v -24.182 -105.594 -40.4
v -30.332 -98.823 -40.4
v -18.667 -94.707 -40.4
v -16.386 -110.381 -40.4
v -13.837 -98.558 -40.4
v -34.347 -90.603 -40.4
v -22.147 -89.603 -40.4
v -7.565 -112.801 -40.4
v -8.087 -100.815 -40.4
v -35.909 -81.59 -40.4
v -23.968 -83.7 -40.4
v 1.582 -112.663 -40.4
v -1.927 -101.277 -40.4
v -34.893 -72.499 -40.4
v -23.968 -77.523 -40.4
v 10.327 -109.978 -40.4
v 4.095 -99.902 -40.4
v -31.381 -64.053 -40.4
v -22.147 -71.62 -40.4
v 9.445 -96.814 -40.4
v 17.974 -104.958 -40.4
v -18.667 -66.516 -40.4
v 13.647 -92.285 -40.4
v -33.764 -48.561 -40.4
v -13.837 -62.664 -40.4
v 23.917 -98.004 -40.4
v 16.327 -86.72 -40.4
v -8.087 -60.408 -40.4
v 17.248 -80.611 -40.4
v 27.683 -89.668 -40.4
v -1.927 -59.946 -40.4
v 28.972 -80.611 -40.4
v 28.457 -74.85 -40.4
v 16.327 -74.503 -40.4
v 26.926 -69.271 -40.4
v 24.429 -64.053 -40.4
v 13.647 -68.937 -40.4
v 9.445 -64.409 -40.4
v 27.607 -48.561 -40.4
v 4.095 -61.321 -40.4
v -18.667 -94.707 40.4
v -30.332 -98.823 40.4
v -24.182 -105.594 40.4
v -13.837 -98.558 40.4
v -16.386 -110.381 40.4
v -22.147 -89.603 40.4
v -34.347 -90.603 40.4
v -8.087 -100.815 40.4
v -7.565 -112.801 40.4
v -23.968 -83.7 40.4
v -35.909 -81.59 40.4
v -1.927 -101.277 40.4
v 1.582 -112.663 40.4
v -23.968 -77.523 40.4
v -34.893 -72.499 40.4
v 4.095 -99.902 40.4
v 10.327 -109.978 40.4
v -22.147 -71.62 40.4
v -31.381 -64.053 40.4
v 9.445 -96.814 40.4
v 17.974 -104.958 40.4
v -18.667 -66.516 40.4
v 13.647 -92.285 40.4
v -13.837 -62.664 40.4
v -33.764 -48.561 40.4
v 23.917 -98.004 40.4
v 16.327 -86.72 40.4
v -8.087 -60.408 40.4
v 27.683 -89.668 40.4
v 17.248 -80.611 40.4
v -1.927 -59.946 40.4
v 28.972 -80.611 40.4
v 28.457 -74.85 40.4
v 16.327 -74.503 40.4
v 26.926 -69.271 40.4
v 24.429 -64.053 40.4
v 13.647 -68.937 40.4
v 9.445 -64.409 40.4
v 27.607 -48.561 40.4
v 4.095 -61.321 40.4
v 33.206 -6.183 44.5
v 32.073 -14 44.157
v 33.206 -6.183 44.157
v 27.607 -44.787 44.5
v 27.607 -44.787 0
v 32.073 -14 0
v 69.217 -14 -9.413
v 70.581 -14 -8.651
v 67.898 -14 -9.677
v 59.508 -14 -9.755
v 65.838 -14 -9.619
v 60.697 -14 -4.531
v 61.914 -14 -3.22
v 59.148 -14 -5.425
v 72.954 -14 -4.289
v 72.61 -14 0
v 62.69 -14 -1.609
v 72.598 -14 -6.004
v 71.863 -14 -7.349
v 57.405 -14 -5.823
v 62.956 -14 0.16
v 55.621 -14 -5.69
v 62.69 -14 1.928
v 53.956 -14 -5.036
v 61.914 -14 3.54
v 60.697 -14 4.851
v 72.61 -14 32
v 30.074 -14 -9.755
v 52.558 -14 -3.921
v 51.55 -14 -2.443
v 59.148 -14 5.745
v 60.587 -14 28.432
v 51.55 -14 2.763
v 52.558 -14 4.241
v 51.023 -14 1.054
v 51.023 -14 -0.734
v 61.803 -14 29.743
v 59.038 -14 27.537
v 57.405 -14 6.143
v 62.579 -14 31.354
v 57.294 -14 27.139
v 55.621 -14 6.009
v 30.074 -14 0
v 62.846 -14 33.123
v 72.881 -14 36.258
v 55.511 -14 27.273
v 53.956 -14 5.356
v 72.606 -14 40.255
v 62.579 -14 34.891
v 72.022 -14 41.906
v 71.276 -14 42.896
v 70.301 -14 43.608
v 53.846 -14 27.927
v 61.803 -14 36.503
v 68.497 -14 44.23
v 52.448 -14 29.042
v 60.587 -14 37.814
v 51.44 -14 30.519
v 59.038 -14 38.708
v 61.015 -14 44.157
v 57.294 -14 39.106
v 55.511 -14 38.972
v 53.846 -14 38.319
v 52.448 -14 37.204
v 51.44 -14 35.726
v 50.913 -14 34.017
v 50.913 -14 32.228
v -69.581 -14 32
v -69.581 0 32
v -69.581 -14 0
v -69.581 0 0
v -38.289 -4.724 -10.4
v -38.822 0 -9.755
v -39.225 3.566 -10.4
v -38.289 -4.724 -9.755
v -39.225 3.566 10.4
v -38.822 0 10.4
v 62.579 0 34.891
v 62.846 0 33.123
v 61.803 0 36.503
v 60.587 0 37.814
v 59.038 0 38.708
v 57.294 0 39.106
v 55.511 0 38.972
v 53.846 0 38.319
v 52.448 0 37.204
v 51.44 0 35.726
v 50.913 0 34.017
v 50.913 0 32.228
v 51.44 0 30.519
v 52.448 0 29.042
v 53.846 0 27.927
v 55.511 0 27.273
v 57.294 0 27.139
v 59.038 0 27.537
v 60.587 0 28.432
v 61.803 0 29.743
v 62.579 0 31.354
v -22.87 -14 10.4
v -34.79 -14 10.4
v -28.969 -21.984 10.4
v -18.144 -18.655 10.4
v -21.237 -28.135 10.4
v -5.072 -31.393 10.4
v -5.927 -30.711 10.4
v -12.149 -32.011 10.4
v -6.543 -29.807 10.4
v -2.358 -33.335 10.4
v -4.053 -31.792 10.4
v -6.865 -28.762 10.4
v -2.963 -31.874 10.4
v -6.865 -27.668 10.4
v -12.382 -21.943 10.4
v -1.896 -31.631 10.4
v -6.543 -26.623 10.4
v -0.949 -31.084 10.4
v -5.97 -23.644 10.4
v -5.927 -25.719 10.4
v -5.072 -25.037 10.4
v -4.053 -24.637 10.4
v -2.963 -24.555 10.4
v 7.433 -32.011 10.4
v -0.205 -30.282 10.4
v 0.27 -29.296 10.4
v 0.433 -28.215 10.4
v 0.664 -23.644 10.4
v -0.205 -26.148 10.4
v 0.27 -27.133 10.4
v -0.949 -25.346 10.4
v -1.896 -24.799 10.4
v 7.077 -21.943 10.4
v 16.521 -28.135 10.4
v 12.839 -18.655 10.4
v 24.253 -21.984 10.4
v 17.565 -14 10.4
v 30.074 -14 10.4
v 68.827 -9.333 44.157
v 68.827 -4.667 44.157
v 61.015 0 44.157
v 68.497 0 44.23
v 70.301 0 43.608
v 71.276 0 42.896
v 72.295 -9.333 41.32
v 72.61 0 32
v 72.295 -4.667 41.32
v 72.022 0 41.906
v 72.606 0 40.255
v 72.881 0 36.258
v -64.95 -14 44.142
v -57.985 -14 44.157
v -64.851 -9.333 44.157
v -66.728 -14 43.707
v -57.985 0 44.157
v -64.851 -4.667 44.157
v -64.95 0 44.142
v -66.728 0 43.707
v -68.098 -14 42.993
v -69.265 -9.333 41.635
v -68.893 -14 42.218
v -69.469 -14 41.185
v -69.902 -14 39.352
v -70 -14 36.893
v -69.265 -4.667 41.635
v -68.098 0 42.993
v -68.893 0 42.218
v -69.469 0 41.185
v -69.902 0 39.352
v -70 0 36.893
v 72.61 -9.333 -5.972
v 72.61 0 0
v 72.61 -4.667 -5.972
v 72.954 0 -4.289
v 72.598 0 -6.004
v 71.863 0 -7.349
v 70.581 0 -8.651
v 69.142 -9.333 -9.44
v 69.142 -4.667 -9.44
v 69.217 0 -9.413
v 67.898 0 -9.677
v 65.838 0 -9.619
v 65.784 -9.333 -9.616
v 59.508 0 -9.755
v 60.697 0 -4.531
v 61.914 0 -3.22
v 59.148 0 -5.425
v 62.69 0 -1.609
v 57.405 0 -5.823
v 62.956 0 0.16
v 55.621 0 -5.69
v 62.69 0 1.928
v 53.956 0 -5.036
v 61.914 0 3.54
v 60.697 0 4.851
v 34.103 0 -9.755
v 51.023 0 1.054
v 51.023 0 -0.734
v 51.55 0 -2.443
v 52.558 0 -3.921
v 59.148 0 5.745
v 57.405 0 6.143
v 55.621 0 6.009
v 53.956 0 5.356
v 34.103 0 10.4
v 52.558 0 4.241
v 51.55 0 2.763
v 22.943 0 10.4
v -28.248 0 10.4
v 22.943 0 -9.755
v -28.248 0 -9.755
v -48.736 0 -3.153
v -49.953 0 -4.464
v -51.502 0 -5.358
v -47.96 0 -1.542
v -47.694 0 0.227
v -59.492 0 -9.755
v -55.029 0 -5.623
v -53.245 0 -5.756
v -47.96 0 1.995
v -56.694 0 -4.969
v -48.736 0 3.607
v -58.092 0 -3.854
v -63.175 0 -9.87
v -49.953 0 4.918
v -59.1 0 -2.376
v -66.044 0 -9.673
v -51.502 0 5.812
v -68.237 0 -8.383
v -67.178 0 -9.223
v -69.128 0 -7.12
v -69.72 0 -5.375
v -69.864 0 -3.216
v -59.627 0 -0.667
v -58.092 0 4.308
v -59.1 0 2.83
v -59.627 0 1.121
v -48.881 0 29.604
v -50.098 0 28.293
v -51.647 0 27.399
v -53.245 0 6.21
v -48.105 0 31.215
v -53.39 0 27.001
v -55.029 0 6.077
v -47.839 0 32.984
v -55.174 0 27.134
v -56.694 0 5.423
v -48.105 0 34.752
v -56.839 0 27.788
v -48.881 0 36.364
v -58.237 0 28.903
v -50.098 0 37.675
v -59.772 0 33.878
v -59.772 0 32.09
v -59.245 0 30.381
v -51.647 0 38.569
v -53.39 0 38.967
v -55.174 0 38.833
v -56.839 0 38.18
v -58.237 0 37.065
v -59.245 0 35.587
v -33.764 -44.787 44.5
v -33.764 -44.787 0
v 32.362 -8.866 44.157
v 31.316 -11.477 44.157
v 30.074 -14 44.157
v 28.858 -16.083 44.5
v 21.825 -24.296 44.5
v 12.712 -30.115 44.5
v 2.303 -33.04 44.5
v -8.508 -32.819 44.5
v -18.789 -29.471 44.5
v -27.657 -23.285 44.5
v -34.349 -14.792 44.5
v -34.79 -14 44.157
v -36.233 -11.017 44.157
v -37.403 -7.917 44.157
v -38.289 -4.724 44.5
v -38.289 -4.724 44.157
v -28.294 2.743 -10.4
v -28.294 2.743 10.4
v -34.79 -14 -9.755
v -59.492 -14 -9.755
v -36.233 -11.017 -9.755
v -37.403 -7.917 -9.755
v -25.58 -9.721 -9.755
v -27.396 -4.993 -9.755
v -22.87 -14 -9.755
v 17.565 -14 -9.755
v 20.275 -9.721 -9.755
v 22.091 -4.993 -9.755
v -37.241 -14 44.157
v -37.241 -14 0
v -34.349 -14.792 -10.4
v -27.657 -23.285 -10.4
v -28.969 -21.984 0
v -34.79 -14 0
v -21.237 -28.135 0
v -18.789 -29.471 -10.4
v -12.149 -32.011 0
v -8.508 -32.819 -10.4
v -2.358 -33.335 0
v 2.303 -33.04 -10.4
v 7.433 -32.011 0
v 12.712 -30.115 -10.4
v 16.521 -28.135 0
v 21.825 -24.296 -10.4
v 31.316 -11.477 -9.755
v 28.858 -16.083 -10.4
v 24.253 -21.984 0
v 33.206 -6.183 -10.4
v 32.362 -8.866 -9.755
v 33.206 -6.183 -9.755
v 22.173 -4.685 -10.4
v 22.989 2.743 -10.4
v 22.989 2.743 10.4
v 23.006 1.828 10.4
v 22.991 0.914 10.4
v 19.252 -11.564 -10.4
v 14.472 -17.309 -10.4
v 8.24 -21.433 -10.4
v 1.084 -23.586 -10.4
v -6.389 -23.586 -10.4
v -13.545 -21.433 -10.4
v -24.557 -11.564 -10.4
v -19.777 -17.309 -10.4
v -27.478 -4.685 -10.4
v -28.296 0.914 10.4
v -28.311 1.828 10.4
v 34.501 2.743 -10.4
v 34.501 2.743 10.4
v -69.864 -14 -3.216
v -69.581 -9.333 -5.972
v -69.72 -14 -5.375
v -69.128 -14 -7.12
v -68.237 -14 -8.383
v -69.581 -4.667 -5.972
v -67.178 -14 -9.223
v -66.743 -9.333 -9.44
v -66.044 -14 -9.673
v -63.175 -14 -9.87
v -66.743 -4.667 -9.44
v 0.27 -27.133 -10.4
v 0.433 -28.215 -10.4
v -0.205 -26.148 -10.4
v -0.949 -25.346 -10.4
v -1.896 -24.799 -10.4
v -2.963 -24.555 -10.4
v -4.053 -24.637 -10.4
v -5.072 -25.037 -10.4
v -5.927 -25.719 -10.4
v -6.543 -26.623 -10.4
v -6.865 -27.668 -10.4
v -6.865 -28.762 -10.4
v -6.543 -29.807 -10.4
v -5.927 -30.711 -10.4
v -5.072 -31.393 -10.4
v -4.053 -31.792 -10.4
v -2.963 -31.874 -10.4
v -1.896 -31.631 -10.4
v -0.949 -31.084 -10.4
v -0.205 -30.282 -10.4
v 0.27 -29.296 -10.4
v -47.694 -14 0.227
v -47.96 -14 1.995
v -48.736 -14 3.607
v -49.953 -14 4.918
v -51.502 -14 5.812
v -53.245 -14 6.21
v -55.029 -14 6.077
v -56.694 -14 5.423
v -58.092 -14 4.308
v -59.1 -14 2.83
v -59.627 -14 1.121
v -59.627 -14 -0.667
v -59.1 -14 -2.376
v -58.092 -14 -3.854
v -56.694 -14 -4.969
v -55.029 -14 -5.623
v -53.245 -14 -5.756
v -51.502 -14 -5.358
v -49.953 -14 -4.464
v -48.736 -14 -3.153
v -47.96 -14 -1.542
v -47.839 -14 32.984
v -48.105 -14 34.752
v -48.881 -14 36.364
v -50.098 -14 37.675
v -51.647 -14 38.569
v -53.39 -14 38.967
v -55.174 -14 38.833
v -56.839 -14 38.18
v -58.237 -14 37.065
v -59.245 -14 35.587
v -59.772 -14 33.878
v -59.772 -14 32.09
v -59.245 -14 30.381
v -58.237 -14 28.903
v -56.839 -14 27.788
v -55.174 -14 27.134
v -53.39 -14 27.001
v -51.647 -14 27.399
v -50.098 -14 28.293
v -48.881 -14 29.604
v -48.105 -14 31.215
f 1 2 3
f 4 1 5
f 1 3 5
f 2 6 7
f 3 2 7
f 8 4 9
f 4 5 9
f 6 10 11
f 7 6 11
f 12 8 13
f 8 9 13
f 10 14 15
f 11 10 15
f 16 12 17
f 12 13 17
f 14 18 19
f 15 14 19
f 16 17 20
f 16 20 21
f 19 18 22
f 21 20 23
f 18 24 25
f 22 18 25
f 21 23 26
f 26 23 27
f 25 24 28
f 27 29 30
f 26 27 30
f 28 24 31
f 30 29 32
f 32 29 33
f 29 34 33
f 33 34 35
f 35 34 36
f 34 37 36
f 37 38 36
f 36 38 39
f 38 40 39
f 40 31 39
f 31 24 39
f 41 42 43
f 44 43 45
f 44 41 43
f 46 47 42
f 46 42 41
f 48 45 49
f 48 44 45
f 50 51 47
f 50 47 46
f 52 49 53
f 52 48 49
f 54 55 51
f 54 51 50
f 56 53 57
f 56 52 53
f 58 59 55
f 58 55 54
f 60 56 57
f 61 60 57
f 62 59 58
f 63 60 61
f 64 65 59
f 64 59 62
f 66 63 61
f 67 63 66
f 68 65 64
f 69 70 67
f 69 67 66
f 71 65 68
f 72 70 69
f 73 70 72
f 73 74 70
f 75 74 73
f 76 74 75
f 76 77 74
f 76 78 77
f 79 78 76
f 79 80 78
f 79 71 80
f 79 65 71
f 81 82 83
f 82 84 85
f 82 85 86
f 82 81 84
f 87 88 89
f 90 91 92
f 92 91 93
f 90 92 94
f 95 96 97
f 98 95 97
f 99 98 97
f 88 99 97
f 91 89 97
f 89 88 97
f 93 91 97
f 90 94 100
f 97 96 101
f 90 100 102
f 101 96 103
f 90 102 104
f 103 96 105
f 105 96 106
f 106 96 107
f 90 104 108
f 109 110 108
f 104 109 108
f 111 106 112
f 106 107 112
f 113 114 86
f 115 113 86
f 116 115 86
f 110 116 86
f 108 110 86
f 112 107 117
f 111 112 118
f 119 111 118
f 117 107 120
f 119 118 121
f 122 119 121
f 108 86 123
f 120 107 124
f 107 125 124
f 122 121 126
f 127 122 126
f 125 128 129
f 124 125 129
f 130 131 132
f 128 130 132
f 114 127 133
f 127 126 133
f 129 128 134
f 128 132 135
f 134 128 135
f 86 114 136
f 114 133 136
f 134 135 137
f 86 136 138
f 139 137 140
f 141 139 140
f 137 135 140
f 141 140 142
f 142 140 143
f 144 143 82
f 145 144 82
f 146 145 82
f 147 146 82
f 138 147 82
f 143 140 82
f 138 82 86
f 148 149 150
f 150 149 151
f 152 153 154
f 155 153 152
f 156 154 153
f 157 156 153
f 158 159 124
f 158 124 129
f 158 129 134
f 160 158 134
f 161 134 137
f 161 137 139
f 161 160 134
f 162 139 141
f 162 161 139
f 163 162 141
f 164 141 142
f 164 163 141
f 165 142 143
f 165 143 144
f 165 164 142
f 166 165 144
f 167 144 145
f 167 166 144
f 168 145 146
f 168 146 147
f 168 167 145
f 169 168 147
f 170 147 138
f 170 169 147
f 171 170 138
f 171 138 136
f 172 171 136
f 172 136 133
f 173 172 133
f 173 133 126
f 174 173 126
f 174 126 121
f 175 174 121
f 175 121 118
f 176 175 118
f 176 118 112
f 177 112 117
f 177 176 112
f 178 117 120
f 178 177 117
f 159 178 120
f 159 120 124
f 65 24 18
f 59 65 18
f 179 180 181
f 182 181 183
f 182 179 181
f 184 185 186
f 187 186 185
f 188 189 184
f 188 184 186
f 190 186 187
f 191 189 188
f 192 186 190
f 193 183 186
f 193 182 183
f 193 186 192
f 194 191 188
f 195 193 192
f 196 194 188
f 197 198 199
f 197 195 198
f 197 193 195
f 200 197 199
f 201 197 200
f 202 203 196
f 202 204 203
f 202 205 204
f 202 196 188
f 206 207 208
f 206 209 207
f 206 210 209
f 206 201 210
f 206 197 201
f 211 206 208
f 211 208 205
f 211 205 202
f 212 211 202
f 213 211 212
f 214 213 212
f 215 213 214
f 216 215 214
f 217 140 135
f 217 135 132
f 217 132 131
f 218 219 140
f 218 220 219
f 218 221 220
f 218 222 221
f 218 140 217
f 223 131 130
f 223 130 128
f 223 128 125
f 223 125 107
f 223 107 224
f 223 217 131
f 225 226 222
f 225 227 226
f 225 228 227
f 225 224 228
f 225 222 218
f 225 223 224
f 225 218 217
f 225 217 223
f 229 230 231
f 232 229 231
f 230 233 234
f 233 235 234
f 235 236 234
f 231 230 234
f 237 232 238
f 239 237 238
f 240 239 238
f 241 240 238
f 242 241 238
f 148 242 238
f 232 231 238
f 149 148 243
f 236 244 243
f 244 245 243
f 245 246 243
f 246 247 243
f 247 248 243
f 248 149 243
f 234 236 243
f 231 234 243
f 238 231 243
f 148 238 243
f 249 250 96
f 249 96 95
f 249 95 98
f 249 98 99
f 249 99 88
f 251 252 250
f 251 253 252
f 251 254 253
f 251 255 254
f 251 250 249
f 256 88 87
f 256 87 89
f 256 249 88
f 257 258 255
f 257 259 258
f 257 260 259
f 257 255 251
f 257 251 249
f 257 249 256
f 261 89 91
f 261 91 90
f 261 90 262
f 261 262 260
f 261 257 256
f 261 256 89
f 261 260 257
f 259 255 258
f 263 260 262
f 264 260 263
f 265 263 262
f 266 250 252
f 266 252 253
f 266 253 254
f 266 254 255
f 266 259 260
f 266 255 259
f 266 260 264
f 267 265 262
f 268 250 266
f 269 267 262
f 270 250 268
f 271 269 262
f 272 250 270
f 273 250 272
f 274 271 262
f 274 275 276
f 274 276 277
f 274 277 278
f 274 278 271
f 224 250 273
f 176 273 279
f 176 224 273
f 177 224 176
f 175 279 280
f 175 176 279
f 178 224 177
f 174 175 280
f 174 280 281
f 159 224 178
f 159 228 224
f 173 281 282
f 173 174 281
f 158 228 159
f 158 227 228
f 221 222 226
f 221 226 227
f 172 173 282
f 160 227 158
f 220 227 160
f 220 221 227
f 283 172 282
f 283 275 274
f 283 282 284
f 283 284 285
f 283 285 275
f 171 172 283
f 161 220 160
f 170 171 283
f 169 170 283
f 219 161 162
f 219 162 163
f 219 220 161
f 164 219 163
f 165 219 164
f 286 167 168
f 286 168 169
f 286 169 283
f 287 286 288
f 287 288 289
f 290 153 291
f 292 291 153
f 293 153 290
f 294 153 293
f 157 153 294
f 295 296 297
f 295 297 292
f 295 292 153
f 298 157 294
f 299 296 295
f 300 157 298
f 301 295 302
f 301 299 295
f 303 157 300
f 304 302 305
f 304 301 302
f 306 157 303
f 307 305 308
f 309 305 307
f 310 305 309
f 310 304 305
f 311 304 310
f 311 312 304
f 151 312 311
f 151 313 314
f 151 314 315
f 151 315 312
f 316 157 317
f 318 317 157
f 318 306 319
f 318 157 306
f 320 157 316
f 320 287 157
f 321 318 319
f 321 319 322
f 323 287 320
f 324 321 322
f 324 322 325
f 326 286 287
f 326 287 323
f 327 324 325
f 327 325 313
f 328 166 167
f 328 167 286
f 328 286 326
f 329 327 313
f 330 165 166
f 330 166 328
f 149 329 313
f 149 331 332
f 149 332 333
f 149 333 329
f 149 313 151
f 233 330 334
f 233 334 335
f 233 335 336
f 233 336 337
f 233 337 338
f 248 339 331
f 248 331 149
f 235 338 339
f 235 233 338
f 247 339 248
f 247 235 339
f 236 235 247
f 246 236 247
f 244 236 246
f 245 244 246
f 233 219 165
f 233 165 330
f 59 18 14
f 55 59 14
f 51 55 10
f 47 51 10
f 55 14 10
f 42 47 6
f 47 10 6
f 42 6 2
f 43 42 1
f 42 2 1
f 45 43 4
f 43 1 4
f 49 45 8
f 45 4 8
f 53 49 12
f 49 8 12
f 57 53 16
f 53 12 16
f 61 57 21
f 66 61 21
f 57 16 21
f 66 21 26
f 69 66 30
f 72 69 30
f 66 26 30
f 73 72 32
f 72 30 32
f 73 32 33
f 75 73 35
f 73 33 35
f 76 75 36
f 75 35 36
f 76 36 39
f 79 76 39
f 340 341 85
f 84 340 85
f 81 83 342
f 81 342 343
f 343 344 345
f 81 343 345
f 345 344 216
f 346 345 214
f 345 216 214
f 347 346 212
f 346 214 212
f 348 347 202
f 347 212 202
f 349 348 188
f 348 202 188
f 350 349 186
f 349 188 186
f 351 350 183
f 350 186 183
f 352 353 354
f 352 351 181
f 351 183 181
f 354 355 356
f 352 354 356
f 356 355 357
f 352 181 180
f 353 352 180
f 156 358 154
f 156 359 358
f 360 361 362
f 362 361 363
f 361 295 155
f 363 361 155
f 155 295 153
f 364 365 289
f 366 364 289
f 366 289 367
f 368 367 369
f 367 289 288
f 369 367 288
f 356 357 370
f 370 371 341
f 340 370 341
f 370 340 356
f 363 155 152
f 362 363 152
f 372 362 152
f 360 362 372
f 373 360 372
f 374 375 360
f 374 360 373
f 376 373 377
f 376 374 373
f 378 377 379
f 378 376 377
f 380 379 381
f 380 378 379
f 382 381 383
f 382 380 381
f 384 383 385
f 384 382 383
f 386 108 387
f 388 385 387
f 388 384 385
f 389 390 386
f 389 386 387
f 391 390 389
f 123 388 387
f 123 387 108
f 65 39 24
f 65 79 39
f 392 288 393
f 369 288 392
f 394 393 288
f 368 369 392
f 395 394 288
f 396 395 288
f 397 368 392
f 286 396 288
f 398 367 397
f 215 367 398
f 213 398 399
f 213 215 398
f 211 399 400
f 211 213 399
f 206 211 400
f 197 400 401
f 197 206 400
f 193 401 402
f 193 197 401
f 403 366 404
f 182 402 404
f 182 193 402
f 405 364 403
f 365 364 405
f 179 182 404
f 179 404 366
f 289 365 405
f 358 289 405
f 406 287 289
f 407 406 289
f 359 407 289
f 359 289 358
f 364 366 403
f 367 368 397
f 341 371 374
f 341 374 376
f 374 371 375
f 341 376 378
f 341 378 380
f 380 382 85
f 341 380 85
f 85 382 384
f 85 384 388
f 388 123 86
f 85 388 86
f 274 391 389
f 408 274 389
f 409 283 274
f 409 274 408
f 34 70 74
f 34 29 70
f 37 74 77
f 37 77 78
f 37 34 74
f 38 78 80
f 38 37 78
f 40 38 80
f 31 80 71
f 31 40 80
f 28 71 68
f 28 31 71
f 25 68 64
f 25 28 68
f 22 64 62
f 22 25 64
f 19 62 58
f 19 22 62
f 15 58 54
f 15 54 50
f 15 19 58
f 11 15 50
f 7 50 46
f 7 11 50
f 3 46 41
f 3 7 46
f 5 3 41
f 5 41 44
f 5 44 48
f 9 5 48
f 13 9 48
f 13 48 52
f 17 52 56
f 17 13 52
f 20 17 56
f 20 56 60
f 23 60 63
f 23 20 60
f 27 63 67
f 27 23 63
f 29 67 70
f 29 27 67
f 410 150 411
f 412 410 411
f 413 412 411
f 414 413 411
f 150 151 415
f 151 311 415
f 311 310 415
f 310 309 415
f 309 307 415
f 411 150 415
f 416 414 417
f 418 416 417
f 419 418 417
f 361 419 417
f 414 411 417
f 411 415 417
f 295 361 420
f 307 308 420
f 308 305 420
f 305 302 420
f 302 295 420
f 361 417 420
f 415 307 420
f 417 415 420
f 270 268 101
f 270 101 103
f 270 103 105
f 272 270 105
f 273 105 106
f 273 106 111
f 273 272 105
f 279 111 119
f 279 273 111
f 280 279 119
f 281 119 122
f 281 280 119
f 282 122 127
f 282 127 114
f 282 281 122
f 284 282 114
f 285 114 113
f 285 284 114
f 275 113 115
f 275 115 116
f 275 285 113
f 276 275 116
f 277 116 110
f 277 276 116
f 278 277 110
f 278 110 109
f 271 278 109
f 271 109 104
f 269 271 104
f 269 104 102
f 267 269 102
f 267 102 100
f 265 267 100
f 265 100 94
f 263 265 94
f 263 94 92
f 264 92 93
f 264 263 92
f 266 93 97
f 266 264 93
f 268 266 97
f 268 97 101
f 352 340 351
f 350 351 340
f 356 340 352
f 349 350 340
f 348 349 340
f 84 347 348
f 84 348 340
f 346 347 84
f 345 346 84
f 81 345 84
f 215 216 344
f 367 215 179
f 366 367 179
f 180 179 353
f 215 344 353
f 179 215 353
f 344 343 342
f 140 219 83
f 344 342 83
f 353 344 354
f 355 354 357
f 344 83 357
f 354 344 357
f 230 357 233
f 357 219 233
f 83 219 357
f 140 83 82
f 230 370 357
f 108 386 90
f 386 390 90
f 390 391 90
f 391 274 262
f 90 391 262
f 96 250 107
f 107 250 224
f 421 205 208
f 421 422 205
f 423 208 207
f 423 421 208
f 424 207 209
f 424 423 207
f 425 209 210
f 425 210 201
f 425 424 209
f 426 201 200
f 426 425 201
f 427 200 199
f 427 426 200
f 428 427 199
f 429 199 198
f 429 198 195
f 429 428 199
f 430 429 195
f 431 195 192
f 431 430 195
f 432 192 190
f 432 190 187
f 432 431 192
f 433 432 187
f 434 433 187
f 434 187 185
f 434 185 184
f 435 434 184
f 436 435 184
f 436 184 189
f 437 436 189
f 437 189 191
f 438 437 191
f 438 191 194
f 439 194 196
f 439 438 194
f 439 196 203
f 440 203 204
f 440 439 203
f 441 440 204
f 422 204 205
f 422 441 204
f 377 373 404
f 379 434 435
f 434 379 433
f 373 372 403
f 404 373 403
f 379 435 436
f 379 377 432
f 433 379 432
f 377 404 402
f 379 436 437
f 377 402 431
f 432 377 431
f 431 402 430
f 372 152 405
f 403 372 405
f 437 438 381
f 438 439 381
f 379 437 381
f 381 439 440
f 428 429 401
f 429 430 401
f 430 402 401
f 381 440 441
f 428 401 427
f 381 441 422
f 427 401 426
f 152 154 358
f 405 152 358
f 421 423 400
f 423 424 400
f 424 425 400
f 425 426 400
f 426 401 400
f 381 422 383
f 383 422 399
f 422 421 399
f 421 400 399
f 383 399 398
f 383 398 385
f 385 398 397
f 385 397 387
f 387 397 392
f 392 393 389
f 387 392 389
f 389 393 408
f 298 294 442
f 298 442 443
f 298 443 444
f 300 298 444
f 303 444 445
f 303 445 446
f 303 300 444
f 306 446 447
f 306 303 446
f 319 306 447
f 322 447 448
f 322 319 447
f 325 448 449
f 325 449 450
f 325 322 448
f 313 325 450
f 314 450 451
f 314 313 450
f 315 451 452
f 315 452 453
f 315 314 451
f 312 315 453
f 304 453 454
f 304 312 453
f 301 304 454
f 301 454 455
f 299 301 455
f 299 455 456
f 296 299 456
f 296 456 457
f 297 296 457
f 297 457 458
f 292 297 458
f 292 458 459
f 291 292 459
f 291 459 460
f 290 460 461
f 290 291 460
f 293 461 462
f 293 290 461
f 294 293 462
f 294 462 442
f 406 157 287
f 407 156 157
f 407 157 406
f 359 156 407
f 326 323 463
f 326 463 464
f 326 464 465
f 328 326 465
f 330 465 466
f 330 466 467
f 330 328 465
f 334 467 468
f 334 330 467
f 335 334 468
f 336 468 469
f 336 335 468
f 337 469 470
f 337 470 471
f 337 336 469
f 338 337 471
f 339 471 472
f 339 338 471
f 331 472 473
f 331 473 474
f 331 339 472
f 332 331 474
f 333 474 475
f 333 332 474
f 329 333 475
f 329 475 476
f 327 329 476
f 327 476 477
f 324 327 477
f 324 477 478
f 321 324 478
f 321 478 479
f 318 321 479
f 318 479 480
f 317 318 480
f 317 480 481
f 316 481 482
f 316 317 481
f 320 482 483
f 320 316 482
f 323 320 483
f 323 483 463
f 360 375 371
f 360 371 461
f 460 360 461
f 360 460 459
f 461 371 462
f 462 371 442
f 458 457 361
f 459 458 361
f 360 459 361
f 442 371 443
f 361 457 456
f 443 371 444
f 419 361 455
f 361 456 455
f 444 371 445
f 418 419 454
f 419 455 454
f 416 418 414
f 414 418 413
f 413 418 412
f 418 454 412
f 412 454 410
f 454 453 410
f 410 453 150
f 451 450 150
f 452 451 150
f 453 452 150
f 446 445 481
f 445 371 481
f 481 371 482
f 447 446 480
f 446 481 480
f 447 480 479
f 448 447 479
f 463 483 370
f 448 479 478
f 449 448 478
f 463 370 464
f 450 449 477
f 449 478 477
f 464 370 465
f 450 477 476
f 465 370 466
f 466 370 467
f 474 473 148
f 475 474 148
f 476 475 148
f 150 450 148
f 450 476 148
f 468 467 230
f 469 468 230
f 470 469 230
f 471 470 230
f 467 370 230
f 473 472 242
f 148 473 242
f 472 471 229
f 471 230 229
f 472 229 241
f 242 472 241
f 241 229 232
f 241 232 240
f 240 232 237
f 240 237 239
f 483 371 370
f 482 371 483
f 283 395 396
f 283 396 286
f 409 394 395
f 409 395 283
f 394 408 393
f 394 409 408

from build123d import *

# Parameters (mm, degrees)
F0_R     = 6
F2_DEPTH = 14
F1_R     = 3.669527392
F3_DEPTH = 10.4
F4_DEPTH = 44.5
F1_R_2   = 20.7233409956
F5_DEPTH = 40.4


with BuildPart() as f2:
    # F0 (on Front) → F2 (new body)
    with BuildSketch(Plane.XZ):
        with BuildLine():
            add(Edge.make_bspline(
                [(61.0146974474, 44.1574379802), (63.7617856681, 44.4336833908), (68.8666510947, 44.8691129113), (73.4147797685, 41.7098119831), (72.8757982385, 35.1158832019), (72.6099535823, 32)],
                knots=[0, 0, 0, 0, 0.3508843363, 0.6166320586, 1, 1, 1, 1], degree=3))
            Line((61.0146974474, 44.1574379802), (-57.9853025526, 44.1574379802))
            add(Edge.make_bspline(
                [(-57.9853025526, 44.1574379802), (-60.2662973619, 44.3336686684), (-64.7497752346, 44.6083745859), (-70.759289285, 42.3863582475), (-69.971378021, 35.3120177128), (-69.5805549622, 32)],
                knots=[0, 0, 0, 0, 0.3283639214, 0.6109116076, 1, 1, 1, 1], degree=3))
            Line((-69.5805549622, 32), (-69.5805549622, 0))
            add(Edge.make_bspline(
                [(-69.5805549622, 0), (-69.8204757619, -2.0988563596), (-70.3178497464, -5.988996106), (-66.8267252912, -10.5370797758), (-62.6444295049, -9.7551429644), (-59.4916455448, -9.7551429644)],
                knots=[0, 0, 0, 0, 0.3368490341, 0.6286370962, 1, 1, 1, 1], degree=3))
            Line((-59.4916455448, -9.7551429644), (-39.3243581057, -9.7551429644))
            Line((-39.3243581057, -9.7551429644), (36.8334986269, -9.7551429644))
            Line((36.8334986269, -9.7551429644), (59.5083544552, -9.7551429644))
            add(Edge.make_bspline(
                [(72.6099535823, 0), (72.8908435255, -1.9692706808), (73.6249139487, -6.1398073623), (68.4834261321, -10.8304544208), (65.358556807, -9.1245863587), (59.5083544552, -9.7551429644)],
                knots=[0, 0, 0, 0, 0.3147924227, 0.6000732053, 1, 1, 1, 1], degree=3))
            Line((72.6099535823, 0), (72.6099535823, 32))
        make_face()
        with Locations((-53.6938116392, 0.2269388525)):
            Circle(F0_R, mode=Mode.SUBTRACT)
        with Locations((56.9562916677, 0.1599236558)):
            Circle(F0_R, mode=Mode.SUBTRACT)
        with Locations((-53.8388539298, 32.9838839062)):
            Circle(F0_R, mode=Mode.SUBTRACT)
        with Locations((56.8460412323, 33.1226997077)):
            Circle(F0_R, mode=Mode.SUBTRACT)
    extrude(amount=F2_DEPTH)

    # F1 (on Top) → F3 (join, symmetric)
    with BuildSketch(Plane.XY):
        with BuildLine():
            Line((-28.2938461751, 2.743112389), (-39.2250753939, 3.5655137617))
            Line((-39.2250753939, 3.5655137617), (-38.2889212397, -4.7235400583))
            ThreePointArc((-38.2889212397, -4.7235400583), (-3.1105555298, -33.3276745557), (33.2061975675, -6.1834786967))
            Line((33.2061975675, -6.1834786967), (34.5008932054, 2.743112389))
            Line((34.5008932054, 2.743112389), (22.9886248708, 2.743112389))
            ThreePointArc((22.9886248708, 2.743112389), (-2.6526106521, -23.8596047048), (-28.2938461751, 2.743112389))
        make_face()
        with Locations((-3.2367382664, -28.2147508115)):
            Circle(F1_R, mode=Mode.SUBTRACT)
    extrude(amount=F3_DEPTH, both=True)

    # F1 (on Top) → F4 (join)
    with BuildSketch(Plane.XY):
        with BuildLine():
            ThreePointArc((33.2061975675, -6.1834786967), (-3.1105555298, -33.3276745557), (-38.2889212397, -4.7235400583))
            Line((-38.2889212397, -4.7235400583), (-33.7641872466, -44.7872020304))
            Line((-33.7641872466, -44.7872020304), (27.6071876287, -44.7872020304))
            Line((27.6071876287, -44.7872020304), (33.2061975675, -6.1834786967))
        make_face()
    extrude(amount=F4_DEPTH)


with BuildPart() as f5:
    # F1 (on Top) → F5 (new body, symmetric)
    with BuildSketch(Plane.XY):
        with BuildLine():
            Line((-8.5403546691, -48.560846597), (-33.7641872466, -48.560846597))
            Line((-33.7641872466, -48.560846597), (-31.3808321953, -64.0526488423))
            ThreePointArc((-31.3808321953, -64.0526488423), (-21.6897271324, -53.7573839468), (-8.5403546691, -48.560846597))
        make_face()
        with BuildLine():
            Line((24.4293808937, -64.0526488423), (27.6071876287, -48.560846597))
            Line((27.6071876287, -48.560846597), (1.5889033675, -48.560846597))
            ThreePointArc((1.5889033675, -48.560846597), (14.7382758308, -53.7573839468), (24.4293808937, -64.0526488423))
        make_face()
        with BuildLine():
            Line((1.5889033675, -48.560846597), (-8.5403546691, -48.560846597))
            ThreePointArc((-8.5403546691, -48.560846597), (-21.6897271324, -53.7573839468), (-31.3808321953, -64.0526488423))
            ThreePointArc((-31.3808321953, -64.0526488423), (-12.0610423886, -111.9031840723), (28.9724776449, -80.6113603218))
            ThreePointArc((28.9724776449, -80.6113603218), (27.8160980997, -72.026043584), (24.4293808937, -64.0526488423))
            ThreePointArc((24.4293808937, -64.0526488423), (14.7382758308, -53.7573839468), (1.5889033675, -48.560846597))
        make_face()
        with Locations((-3.4757256508, -80.6113603218)):
            Circle(F1_R_2, mode=Mode.SUBTRACT)
    extrude(amount=F5_DEPTH, both=True)


solid = Compound([f2.part, f5.part])
